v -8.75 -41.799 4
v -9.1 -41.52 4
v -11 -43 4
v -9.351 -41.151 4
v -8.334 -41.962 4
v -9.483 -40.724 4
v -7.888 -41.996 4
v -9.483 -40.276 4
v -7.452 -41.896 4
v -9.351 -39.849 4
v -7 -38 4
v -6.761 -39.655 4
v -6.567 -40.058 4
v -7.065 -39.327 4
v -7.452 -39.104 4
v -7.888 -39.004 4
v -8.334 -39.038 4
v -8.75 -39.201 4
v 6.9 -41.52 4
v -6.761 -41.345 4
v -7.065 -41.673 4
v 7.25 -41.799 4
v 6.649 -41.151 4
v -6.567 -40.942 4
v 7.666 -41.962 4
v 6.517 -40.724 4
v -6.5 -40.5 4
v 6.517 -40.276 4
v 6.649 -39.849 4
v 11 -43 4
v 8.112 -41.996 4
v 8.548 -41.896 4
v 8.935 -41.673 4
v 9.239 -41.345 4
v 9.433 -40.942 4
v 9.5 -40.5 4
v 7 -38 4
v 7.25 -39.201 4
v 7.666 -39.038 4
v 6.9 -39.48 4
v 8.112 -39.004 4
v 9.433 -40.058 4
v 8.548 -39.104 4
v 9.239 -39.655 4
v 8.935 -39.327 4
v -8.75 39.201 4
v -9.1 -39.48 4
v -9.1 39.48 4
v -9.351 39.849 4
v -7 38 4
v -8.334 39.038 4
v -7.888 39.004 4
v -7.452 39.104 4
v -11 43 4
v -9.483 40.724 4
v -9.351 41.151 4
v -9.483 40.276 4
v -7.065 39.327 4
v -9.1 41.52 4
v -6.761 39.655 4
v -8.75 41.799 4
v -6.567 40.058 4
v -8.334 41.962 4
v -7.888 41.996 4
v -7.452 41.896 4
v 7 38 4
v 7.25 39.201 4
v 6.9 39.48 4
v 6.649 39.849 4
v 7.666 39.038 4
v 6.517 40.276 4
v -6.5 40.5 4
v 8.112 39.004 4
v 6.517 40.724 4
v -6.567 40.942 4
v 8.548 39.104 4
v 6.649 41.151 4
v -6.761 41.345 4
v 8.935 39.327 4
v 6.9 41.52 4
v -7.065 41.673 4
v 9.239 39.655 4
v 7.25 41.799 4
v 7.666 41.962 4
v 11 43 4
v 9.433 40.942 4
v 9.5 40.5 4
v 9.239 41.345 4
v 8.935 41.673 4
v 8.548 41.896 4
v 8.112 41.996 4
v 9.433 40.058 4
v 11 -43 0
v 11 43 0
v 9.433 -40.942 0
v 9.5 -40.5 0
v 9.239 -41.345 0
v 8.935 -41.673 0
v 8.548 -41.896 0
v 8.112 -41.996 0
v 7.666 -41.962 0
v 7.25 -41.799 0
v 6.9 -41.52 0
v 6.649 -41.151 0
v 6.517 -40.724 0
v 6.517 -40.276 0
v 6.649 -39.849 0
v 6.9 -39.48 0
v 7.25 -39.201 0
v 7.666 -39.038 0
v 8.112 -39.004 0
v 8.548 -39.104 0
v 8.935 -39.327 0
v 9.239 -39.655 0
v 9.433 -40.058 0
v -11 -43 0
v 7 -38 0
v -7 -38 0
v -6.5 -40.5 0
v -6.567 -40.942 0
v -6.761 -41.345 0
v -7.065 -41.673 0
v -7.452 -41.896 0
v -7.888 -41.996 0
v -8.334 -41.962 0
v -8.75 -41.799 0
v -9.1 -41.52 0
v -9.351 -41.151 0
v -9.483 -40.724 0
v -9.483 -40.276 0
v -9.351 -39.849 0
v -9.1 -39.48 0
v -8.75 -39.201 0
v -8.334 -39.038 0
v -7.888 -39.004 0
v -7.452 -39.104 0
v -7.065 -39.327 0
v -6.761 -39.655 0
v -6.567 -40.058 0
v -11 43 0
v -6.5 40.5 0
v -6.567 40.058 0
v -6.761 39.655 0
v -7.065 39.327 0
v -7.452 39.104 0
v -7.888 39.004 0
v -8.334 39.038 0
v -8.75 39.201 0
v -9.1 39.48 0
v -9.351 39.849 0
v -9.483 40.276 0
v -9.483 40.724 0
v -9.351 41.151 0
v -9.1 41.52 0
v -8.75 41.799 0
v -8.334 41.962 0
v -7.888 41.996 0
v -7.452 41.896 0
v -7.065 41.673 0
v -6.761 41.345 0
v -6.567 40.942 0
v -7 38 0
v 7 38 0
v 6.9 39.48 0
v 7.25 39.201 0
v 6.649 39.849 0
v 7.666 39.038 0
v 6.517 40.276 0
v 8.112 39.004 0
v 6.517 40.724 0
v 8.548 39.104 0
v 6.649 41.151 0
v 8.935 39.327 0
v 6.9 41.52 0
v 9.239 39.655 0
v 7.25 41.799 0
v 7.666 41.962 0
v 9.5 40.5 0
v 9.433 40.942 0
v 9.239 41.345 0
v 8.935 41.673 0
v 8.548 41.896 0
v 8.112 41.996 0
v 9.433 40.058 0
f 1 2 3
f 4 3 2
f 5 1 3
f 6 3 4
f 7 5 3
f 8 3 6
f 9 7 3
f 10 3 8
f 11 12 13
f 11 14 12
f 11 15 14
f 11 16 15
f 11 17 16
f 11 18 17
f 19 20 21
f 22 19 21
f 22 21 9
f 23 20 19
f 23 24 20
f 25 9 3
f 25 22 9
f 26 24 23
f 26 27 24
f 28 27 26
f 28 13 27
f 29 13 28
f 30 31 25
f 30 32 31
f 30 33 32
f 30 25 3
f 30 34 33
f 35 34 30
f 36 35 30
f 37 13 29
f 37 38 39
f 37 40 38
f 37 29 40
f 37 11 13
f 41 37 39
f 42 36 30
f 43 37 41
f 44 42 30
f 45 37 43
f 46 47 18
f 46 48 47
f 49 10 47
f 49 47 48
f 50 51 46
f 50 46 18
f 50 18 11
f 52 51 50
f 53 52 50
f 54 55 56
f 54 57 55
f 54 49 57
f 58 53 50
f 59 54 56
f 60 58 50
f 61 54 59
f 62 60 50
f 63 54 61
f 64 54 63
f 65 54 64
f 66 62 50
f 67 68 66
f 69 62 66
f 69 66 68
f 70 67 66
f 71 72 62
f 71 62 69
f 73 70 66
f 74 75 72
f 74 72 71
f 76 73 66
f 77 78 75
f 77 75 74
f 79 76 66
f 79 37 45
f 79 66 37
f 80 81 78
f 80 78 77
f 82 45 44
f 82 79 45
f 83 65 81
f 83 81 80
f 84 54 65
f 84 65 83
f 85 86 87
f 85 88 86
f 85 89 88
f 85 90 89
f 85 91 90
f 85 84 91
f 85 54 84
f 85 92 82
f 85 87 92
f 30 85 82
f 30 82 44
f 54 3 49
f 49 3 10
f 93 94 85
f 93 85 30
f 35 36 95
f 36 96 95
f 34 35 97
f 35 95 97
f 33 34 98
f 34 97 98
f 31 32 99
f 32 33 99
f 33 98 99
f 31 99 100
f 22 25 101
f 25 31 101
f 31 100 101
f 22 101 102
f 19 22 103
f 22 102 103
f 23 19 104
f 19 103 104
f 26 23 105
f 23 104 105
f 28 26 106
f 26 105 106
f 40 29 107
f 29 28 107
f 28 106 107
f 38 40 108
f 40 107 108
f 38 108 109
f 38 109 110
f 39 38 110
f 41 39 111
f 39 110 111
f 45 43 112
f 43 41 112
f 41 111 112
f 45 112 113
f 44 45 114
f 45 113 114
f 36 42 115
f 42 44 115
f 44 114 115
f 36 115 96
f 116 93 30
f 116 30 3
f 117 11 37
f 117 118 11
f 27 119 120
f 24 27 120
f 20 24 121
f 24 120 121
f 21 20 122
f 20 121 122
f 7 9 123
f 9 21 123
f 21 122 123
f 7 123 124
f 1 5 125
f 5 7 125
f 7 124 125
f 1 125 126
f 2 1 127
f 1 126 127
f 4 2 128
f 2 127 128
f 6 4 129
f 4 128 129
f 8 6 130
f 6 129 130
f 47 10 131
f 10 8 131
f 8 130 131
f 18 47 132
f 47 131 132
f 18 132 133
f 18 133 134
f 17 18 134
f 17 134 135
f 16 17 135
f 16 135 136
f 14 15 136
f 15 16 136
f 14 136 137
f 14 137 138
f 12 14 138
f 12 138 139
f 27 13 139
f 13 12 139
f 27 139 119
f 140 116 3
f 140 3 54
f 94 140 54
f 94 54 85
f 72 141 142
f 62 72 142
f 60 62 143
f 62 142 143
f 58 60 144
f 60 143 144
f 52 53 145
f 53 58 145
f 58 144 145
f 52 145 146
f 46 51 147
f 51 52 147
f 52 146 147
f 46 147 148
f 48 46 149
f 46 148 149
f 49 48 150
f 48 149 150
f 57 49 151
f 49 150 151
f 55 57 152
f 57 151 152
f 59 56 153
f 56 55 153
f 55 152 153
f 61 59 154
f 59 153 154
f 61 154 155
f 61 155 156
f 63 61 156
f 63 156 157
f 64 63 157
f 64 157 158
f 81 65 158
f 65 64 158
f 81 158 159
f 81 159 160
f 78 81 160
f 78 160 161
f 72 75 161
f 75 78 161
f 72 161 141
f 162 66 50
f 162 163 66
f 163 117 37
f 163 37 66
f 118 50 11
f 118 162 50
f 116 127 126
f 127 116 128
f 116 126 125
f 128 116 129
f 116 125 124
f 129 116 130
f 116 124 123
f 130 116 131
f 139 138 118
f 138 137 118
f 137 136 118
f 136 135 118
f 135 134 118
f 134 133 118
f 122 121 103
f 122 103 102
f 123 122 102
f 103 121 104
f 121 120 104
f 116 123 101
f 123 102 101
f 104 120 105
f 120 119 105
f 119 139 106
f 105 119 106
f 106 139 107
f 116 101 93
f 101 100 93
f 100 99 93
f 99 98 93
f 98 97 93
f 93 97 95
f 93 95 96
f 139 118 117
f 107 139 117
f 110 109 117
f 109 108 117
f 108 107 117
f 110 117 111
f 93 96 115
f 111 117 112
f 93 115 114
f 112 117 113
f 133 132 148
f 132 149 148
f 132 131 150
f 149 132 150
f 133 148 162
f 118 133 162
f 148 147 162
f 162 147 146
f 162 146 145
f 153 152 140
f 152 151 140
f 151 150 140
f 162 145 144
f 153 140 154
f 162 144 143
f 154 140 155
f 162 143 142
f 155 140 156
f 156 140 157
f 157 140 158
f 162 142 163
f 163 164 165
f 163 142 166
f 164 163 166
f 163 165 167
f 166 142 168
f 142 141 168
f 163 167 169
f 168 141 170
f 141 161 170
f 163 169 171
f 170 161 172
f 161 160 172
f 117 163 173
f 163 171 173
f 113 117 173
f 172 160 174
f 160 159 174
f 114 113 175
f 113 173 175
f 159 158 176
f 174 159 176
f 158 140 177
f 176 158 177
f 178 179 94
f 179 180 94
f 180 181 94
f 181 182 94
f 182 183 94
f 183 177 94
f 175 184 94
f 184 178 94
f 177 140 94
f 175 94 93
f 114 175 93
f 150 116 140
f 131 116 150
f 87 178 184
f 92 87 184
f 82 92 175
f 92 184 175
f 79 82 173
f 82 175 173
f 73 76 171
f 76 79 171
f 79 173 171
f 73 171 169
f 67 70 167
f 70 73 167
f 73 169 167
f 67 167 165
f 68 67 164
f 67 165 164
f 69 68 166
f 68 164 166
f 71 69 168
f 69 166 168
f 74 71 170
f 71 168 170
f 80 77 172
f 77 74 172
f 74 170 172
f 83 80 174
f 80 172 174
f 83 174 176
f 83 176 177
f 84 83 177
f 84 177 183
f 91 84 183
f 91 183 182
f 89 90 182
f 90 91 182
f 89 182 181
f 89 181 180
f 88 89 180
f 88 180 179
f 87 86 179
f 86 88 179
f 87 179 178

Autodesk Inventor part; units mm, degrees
ref_plane "YZ Plane" through (0, 0, 0) normal (1, 0, 0) x (0, 1, 0)
ref_plane "XZ Plane" through (0, 0, 0) normal (0, 1, 0) x (-1, 0, 0)
ref_plane "XY Plane" through (0, 0, 0) normal (0, 0, 1) x (1, 0, 0)
sketch "Sketch1" plane through (0, 0, 0) normal (0, 0, 1) x (1, 0, 0)
  line L0 (-11, 43) -> (11, 43)
  line L1 (11, 43) -> (11, -43)
  line L2 (11, -43) -> (-11, -43)
  line L3 (-11, -43) -> (-11, 43)
  line L4 (-11, 43) -> (11, -43) construction
  line L5 (11, 43) -> (-11, -43) construction
  circle A0 centre (-8, 40.5) radius 1.5
  circle A1 centre (8, 40.5) radius 1.5
  circle A2 centre (-8, -40.5) radius 1.5
  circle A3 centre (8, -40.5) radius 1.5
  line L6 (7, 38) -> (-7, 38)
  line L7 (-7, 38) -> (-7, -38)
  line L8 (-7, -38) -> (7, -38)
  line L9 (7, -38) -> (7, 38)
  line L10 (7, 38) -> (-7, -38) construction
  line L11 (-7, 38) -> (7, -38) construction
  point P0 (0, 0)
  dimension "d0" = 22
  dimension "d1" = 86
  dimension "d2" = 3
  dimension "d3" = 3
  dimension "d4" = 3
  dimension "d5" = 3
  dimension "d6" = 3
  dimension "d7" = 2.5
  dimension "d8" = 3
  dimension "d9" = 2.5
  dimension "d10" = 2.5
  dimension "d11" = 3
  dimension "d12" = 3
  dimension "d13" = 2.5
  dimension "d14" = 14
  dimension "d15" = 76
extrude "Extrusion1" add sketch "Sketch1" along normal blind 4
properties part number "PartC" material "Aluminum 6061"
